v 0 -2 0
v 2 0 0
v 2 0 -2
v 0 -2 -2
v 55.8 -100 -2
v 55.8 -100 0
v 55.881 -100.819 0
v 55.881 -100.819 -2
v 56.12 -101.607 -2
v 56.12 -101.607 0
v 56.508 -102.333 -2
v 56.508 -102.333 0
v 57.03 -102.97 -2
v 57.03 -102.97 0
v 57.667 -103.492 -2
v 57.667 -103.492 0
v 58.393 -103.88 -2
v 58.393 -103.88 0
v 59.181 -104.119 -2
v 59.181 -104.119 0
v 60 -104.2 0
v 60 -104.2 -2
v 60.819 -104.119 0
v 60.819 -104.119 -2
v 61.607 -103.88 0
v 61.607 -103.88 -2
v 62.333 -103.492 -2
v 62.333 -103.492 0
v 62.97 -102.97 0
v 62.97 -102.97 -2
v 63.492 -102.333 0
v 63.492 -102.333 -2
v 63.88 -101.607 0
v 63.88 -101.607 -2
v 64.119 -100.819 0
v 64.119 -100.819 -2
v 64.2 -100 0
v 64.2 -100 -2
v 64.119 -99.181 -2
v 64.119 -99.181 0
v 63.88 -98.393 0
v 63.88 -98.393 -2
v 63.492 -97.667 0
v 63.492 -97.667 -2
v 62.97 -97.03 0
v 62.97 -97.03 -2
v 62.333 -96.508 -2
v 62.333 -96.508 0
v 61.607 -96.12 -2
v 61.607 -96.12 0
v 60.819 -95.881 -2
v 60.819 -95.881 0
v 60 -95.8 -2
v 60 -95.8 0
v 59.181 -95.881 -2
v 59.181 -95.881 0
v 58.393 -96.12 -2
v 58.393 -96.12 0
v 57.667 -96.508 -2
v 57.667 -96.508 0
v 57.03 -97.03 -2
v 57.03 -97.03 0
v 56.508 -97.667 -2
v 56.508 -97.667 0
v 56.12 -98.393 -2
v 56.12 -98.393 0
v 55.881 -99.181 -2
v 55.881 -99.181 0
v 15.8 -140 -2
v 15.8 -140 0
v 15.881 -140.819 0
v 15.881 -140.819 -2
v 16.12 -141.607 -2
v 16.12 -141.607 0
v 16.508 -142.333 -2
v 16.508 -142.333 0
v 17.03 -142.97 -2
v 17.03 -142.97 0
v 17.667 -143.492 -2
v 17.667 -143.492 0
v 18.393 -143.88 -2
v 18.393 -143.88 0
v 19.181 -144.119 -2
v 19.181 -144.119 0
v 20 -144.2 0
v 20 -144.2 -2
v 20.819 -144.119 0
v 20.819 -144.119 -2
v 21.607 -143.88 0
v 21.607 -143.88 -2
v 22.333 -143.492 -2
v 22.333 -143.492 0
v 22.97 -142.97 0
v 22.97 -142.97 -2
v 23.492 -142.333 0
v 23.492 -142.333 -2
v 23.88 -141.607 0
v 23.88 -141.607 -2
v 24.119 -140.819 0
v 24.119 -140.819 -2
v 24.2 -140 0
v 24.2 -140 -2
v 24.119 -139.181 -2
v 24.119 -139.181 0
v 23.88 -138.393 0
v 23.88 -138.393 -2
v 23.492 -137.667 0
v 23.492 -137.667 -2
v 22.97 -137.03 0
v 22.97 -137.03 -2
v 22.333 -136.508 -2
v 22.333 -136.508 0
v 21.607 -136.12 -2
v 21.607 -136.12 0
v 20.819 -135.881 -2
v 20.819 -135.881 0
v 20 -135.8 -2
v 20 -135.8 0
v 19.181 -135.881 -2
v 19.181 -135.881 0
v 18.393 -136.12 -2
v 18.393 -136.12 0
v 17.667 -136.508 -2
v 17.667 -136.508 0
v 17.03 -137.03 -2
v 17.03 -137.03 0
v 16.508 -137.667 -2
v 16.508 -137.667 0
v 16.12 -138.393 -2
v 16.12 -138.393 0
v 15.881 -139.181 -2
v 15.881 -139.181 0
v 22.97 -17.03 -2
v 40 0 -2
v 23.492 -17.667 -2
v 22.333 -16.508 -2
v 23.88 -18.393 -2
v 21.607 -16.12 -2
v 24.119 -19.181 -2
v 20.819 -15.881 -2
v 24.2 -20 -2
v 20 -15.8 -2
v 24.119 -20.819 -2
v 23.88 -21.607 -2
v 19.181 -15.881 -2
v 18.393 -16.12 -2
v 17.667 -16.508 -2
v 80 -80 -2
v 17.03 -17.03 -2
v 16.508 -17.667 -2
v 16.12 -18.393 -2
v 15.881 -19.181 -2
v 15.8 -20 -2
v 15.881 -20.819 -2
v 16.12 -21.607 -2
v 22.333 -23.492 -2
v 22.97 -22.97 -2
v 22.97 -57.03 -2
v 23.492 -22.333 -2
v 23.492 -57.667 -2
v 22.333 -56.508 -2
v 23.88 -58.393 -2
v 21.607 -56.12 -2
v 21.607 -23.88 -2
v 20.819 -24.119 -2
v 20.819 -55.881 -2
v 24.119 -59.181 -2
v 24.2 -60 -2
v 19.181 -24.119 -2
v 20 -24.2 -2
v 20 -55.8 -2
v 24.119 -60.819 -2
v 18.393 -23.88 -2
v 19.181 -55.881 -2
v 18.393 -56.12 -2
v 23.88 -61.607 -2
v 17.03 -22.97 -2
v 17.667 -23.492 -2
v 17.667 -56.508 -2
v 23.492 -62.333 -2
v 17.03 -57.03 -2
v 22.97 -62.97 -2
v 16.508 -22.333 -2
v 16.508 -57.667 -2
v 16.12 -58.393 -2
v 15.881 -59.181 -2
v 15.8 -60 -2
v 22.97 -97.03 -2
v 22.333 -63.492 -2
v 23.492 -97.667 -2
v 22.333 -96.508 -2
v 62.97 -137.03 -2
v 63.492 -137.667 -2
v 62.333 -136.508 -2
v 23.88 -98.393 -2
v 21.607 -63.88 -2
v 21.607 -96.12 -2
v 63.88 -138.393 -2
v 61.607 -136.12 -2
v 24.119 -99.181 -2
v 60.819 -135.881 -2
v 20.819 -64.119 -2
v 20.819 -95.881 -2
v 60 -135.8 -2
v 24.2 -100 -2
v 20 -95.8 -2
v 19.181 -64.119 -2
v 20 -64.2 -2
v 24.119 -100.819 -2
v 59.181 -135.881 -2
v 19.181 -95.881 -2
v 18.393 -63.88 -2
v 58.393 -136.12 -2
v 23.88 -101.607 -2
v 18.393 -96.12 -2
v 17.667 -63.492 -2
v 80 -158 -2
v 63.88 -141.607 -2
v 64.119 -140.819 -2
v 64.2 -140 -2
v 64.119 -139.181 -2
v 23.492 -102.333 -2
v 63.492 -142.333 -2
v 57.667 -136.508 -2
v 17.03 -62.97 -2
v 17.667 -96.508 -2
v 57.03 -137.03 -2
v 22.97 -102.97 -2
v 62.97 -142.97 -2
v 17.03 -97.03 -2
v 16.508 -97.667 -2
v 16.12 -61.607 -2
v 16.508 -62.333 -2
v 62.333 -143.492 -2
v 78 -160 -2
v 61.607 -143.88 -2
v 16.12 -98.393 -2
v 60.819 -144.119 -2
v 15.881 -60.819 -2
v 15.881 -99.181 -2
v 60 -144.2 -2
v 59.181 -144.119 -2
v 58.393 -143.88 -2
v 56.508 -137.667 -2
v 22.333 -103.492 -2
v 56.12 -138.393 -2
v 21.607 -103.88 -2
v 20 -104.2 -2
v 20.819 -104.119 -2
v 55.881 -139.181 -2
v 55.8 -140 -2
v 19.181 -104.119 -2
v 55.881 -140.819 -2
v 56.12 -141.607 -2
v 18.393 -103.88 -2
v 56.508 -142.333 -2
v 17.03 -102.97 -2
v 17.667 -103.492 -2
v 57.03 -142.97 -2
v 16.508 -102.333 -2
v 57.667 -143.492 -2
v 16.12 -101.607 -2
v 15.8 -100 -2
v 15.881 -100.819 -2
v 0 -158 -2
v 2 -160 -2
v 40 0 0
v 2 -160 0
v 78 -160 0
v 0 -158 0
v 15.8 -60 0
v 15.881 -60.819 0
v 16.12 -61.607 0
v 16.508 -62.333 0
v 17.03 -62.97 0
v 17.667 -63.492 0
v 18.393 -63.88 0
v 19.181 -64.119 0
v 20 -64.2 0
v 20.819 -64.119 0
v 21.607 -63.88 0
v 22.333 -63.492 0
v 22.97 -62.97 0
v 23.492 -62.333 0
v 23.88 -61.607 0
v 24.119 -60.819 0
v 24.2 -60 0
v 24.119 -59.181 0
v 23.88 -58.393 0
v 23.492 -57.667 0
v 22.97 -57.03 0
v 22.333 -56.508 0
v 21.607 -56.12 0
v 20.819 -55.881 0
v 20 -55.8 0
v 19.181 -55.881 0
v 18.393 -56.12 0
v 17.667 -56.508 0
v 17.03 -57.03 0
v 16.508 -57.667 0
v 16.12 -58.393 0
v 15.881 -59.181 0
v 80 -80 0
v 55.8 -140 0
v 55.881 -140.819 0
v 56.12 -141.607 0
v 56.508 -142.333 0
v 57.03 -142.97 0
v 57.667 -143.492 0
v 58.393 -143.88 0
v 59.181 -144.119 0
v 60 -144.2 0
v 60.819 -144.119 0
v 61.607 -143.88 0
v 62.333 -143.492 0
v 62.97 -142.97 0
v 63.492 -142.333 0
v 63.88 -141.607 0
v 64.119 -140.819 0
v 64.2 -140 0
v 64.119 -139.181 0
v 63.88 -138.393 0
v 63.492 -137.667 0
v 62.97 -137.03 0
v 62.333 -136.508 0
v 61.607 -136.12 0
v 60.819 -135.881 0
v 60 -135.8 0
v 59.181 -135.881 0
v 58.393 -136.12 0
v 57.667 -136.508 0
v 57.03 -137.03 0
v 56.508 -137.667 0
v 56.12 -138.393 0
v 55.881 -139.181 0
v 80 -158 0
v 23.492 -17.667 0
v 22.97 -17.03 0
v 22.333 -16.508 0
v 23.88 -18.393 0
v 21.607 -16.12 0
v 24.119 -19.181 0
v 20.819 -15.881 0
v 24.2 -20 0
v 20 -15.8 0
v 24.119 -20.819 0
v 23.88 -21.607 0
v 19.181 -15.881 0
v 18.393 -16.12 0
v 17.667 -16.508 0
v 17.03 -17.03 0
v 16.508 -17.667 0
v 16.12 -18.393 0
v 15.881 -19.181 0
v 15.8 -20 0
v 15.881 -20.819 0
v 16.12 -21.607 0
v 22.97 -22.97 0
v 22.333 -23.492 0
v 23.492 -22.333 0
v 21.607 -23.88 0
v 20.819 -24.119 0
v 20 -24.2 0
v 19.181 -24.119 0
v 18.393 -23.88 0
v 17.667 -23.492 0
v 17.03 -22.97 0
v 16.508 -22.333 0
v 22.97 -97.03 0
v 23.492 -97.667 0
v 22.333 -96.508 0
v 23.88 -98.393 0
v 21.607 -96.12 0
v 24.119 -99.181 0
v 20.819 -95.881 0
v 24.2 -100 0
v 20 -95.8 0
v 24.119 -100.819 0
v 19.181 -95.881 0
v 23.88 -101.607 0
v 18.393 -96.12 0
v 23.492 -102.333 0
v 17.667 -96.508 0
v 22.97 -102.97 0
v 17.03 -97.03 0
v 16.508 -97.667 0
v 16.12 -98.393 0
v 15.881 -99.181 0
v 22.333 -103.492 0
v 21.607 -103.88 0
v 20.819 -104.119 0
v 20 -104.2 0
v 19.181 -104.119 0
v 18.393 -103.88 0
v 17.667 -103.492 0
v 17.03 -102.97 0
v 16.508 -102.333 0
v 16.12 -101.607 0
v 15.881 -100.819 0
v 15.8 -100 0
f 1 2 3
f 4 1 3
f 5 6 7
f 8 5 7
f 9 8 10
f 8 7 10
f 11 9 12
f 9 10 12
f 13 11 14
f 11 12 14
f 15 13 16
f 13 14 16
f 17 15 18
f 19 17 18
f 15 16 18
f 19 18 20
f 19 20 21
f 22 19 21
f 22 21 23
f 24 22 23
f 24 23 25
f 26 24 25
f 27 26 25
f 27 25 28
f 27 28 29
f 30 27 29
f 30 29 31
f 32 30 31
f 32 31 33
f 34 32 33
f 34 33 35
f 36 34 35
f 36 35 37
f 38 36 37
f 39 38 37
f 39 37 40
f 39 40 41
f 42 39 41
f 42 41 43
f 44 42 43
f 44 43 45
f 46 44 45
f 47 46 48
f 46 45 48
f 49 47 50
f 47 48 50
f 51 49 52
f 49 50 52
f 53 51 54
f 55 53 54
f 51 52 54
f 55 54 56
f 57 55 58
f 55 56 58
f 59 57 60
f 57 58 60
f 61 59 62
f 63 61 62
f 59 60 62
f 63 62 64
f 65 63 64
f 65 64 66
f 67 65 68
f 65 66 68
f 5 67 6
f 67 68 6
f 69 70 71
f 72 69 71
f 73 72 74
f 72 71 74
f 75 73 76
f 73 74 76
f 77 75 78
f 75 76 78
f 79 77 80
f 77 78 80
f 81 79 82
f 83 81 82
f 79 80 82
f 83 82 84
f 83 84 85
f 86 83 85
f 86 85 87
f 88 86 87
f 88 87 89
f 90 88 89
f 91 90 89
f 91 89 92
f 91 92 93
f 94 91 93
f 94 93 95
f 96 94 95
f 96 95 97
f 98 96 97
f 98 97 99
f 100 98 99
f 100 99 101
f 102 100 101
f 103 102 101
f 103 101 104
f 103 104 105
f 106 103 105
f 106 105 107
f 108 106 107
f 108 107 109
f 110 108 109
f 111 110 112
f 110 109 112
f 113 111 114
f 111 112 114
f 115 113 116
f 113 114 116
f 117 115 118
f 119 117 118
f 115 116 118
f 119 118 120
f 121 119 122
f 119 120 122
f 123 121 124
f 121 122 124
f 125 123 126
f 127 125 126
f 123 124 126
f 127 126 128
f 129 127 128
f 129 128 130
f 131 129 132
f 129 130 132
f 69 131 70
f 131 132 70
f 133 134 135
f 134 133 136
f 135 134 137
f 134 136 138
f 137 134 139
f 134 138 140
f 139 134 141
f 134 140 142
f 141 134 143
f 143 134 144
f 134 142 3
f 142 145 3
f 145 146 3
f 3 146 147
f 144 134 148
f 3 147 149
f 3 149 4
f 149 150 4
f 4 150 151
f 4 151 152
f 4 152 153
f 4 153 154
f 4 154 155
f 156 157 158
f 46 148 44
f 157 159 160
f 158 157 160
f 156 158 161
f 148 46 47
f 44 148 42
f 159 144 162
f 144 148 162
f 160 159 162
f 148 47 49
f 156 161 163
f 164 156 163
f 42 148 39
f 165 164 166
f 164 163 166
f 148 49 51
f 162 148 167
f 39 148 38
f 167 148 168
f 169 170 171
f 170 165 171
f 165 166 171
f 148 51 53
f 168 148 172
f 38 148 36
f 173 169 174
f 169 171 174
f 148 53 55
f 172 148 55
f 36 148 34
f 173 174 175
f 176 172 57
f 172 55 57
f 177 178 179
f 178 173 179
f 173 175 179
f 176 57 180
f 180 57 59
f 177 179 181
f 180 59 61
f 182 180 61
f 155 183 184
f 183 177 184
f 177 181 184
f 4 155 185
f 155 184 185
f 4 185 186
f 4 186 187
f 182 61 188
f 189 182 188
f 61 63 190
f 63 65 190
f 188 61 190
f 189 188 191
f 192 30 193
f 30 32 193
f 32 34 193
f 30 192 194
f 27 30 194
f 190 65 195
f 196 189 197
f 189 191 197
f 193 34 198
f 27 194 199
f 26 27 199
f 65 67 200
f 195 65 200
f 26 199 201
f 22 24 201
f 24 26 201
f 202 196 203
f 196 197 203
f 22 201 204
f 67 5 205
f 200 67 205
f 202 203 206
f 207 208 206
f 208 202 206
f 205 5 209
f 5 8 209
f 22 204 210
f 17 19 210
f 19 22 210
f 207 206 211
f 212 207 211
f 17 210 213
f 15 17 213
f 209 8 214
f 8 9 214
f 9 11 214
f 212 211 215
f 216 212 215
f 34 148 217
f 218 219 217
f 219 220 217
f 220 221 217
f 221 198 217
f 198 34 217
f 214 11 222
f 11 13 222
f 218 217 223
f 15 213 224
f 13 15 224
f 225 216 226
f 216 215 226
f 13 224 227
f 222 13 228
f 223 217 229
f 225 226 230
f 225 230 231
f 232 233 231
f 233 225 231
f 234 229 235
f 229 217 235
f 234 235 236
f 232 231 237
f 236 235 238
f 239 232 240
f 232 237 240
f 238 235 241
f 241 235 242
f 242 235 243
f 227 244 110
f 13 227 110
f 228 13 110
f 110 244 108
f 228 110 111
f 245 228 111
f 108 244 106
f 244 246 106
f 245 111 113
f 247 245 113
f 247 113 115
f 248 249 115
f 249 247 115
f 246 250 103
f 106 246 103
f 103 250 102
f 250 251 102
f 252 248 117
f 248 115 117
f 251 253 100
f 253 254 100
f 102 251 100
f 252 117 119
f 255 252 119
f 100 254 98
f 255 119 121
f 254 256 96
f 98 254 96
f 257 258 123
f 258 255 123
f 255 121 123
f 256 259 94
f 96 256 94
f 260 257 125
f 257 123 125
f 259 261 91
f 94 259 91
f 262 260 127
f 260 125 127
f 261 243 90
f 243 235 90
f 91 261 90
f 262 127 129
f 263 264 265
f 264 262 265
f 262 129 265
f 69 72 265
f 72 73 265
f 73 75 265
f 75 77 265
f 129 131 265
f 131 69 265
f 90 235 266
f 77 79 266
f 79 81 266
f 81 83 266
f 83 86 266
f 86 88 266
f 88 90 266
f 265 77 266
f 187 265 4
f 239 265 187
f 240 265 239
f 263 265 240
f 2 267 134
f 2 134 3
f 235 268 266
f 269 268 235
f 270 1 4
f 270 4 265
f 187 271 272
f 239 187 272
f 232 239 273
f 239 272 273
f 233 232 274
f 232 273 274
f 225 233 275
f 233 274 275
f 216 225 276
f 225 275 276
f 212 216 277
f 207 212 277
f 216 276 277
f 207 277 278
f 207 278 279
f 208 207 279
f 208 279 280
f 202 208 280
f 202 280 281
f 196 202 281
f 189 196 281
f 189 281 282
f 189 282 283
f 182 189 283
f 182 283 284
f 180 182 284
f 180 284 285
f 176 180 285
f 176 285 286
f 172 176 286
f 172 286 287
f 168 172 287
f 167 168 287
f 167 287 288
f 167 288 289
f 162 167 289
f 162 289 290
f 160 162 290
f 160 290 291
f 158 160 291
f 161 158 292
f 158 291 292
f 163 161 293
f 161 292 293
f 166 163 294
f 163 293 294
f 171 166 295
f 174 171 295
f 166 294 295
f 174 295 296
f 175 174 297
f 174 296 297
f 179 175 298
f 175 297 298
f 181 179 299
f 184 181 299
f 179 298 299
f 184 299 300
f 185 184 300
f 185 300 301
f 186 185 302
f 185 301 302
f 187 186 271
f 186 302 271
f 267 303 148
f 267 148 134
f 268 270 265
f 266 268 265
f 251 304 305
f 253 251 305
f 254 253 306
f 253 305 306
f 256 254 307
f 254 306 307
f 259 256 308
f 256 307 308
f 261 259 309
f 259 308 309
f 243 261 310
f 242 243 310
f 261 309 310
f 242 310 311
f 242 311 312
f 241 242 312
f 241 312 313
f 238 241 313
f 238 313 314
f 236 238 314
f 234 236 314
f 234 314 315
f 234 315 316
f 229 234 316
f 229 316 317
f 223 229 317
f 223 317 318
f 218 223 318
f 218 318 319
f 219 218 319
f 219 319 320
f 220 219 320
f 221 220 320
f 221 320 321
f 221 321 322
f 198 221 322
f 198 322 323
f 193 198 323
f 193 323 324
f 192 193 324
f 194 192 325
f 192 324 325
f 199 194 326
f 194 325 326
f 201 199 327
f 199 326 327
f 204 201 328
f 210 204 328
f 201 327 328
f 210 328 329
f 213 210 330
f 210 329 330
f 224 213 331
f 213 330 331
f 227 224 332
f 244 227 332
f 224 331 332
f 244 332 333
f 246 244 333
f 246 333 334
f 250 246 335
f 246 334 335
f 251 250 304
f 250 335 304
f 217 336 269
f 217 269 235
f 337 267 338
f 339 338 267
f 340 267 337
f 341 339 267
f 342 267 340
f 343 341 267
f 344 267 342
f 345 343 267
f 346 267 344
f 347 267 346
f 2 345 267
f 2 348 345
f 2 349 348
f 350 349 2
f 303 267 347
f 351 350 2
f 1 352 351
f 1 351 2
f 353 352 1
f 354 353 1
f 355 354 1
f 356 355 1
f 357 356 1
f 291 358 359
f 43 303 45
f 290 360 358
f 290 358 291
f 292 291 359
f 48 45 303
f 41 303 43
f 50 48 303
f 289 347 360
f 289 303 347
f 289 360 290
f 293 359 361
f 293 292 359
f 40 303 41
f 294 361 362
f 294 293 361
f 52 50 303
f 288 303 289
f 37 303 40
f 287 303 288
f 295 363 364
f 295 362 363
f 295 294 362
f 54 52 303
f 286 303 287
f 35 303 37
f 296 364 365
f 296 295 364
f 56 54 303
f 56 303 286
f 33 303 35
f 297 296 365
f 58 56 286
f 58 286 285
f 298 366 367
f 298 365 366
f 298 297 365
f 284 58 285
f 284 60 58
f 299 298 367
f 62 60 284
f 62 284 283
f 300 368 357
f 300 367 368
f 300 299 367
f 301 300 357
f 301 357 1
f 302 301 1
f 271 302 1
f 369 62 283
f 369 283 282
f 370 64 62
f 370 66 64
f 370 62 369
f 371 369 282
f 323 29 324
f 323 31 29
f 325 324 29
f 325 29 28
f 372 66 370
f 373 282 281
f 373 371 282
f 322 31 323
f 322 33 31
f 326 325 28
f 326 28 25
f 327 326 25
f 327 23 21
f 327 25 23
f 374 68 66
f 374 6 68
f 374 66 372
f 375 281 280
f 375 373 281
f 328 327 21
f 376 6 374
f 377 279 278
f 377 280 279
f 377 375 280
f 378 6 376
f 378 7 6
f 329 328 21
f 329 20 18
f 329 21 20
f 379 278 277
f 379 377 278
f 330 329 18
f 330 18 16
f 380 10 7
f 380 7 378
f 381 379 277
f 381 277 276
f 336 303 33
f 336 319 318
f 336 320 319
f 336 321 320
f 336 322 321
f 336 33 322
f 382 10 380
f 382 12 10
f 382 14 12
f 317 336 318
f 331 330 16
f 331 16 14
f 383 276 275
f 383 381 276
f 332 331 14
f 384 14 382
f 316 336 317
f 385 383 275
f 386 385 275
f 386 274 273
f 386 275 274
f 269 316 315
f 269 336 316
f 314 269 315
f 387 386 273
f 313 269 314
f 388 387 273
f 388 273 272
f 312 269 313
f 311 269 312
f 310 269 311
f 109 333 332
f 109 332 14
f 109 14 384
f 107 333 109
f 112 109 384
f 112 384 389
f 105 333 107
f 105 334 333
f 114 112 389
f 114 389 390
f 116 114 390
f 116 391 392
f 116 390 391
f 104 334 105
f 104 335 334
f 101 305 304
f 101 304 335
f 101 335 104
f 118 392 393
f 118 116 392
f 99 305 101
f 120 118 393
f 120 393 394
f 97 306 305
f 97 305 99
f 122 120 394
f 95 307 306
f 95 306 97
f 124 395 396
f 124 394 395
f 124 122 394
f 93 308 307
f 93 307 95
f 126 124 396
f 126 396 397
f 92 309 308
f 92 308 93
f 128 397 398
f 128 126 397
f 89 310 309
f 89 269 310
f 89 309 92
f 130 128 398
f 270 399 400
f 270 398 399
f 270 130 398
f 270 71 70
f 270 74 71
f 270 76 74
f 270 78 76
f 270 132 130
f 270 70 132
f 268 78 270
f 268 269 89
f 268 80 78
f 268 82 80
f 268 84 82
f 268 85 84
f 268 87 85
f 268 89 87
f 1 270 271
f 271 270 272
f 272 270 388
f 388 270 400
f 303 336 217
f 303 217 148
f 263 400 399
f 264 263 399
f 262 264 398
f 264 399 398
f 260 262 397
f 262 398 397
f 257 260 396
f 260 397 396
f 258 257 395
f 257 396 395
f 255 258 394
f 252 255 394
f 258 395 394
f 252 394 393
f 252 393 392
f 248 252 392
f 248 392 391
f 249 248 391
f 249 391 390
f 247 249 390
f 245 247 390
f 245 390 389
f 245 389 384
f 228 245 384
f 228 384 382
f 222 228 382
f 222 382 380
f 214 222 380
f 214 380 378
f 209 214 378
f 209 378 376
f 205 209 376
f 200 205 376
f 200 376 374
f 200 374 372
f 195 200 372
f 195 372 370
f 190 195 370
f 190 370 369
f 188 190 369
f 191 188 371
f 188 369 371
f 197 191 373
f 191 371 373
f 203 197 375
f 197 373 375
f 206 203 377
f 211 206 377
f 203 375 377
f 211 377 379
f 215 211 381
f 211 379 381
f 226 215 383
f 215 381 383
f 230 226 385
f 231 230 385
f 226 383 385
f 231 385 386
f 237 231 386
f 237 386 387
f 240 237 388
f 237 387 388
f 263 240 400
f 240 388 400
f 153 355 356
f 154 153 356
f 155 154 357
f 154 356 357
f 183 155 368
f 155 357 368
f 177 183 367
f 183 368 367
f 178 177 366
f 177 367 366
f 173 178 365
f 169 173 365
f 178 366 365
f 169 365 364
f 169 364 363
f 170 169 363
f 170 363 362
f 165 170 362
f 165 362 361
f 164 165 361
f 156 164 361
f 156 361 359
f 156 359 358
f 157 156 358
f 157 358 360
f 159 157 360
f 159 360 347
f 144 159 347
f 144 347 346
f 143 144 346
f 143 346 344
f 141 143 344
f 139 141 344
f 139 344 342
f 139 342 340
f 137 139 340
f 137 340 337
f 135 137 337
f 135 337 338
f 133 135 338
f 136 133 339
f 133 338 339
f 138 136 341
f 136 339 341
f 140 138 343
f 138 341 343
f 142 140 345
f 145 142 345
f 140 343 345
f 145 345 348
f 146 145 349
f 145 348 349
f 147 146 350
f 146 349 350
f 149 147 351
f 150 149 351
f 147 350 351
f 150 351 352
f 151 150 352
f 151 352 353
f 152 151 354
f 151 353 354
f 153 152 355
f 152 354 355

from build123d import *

# Parameters (mm, degrees)
EXTRUDE_1_DEPTH       = 2
HOLE_WIZARD_M81_D     = 8.4
HOLE_WIZARD_M81_DEPTH = 2
CHAMFER_1_SIZE        = 2


with BuildPart() as part:
    # Эскиз1 → Бобышка-Вытянуть1 (new body)
    with BuildSketch(Plane(origin=(0, 0, 0), x_dir=(1, 0, 0), z_dir=(0, 0, -1))):
        Polygon((0, 0), (0, 160), (80, 160), (80, 80), (40, 0), align=None)
    extrude(amount=EXTRUDE_1_DEPTH)

    # Отверстие с зазором M81
    with Locations(Plane(origin=(0, 0, -2), x_dir=(1, 0, 0), z_dir=(0, 0, -1))):
        with Locations((20, 140), (20, 100), (20, 60), (20, 20), (60, 140), (60, 100)):
            Hole(HOLE_WIZARD_M81_D / 2, depth=HOLE_WIZARD_M81_DEPTH)

    # Фаска1
    chamfer_1_edges = [part.edges().sort_by_distance(p)[0] for p in [
        (0, 0, -1),
        (0, -160, -1),
        (80, -160, -1),
    ]]
    chamfer(chamfer_1_edges, length=CHAMFER_1_SIZE)


solid = part.part
